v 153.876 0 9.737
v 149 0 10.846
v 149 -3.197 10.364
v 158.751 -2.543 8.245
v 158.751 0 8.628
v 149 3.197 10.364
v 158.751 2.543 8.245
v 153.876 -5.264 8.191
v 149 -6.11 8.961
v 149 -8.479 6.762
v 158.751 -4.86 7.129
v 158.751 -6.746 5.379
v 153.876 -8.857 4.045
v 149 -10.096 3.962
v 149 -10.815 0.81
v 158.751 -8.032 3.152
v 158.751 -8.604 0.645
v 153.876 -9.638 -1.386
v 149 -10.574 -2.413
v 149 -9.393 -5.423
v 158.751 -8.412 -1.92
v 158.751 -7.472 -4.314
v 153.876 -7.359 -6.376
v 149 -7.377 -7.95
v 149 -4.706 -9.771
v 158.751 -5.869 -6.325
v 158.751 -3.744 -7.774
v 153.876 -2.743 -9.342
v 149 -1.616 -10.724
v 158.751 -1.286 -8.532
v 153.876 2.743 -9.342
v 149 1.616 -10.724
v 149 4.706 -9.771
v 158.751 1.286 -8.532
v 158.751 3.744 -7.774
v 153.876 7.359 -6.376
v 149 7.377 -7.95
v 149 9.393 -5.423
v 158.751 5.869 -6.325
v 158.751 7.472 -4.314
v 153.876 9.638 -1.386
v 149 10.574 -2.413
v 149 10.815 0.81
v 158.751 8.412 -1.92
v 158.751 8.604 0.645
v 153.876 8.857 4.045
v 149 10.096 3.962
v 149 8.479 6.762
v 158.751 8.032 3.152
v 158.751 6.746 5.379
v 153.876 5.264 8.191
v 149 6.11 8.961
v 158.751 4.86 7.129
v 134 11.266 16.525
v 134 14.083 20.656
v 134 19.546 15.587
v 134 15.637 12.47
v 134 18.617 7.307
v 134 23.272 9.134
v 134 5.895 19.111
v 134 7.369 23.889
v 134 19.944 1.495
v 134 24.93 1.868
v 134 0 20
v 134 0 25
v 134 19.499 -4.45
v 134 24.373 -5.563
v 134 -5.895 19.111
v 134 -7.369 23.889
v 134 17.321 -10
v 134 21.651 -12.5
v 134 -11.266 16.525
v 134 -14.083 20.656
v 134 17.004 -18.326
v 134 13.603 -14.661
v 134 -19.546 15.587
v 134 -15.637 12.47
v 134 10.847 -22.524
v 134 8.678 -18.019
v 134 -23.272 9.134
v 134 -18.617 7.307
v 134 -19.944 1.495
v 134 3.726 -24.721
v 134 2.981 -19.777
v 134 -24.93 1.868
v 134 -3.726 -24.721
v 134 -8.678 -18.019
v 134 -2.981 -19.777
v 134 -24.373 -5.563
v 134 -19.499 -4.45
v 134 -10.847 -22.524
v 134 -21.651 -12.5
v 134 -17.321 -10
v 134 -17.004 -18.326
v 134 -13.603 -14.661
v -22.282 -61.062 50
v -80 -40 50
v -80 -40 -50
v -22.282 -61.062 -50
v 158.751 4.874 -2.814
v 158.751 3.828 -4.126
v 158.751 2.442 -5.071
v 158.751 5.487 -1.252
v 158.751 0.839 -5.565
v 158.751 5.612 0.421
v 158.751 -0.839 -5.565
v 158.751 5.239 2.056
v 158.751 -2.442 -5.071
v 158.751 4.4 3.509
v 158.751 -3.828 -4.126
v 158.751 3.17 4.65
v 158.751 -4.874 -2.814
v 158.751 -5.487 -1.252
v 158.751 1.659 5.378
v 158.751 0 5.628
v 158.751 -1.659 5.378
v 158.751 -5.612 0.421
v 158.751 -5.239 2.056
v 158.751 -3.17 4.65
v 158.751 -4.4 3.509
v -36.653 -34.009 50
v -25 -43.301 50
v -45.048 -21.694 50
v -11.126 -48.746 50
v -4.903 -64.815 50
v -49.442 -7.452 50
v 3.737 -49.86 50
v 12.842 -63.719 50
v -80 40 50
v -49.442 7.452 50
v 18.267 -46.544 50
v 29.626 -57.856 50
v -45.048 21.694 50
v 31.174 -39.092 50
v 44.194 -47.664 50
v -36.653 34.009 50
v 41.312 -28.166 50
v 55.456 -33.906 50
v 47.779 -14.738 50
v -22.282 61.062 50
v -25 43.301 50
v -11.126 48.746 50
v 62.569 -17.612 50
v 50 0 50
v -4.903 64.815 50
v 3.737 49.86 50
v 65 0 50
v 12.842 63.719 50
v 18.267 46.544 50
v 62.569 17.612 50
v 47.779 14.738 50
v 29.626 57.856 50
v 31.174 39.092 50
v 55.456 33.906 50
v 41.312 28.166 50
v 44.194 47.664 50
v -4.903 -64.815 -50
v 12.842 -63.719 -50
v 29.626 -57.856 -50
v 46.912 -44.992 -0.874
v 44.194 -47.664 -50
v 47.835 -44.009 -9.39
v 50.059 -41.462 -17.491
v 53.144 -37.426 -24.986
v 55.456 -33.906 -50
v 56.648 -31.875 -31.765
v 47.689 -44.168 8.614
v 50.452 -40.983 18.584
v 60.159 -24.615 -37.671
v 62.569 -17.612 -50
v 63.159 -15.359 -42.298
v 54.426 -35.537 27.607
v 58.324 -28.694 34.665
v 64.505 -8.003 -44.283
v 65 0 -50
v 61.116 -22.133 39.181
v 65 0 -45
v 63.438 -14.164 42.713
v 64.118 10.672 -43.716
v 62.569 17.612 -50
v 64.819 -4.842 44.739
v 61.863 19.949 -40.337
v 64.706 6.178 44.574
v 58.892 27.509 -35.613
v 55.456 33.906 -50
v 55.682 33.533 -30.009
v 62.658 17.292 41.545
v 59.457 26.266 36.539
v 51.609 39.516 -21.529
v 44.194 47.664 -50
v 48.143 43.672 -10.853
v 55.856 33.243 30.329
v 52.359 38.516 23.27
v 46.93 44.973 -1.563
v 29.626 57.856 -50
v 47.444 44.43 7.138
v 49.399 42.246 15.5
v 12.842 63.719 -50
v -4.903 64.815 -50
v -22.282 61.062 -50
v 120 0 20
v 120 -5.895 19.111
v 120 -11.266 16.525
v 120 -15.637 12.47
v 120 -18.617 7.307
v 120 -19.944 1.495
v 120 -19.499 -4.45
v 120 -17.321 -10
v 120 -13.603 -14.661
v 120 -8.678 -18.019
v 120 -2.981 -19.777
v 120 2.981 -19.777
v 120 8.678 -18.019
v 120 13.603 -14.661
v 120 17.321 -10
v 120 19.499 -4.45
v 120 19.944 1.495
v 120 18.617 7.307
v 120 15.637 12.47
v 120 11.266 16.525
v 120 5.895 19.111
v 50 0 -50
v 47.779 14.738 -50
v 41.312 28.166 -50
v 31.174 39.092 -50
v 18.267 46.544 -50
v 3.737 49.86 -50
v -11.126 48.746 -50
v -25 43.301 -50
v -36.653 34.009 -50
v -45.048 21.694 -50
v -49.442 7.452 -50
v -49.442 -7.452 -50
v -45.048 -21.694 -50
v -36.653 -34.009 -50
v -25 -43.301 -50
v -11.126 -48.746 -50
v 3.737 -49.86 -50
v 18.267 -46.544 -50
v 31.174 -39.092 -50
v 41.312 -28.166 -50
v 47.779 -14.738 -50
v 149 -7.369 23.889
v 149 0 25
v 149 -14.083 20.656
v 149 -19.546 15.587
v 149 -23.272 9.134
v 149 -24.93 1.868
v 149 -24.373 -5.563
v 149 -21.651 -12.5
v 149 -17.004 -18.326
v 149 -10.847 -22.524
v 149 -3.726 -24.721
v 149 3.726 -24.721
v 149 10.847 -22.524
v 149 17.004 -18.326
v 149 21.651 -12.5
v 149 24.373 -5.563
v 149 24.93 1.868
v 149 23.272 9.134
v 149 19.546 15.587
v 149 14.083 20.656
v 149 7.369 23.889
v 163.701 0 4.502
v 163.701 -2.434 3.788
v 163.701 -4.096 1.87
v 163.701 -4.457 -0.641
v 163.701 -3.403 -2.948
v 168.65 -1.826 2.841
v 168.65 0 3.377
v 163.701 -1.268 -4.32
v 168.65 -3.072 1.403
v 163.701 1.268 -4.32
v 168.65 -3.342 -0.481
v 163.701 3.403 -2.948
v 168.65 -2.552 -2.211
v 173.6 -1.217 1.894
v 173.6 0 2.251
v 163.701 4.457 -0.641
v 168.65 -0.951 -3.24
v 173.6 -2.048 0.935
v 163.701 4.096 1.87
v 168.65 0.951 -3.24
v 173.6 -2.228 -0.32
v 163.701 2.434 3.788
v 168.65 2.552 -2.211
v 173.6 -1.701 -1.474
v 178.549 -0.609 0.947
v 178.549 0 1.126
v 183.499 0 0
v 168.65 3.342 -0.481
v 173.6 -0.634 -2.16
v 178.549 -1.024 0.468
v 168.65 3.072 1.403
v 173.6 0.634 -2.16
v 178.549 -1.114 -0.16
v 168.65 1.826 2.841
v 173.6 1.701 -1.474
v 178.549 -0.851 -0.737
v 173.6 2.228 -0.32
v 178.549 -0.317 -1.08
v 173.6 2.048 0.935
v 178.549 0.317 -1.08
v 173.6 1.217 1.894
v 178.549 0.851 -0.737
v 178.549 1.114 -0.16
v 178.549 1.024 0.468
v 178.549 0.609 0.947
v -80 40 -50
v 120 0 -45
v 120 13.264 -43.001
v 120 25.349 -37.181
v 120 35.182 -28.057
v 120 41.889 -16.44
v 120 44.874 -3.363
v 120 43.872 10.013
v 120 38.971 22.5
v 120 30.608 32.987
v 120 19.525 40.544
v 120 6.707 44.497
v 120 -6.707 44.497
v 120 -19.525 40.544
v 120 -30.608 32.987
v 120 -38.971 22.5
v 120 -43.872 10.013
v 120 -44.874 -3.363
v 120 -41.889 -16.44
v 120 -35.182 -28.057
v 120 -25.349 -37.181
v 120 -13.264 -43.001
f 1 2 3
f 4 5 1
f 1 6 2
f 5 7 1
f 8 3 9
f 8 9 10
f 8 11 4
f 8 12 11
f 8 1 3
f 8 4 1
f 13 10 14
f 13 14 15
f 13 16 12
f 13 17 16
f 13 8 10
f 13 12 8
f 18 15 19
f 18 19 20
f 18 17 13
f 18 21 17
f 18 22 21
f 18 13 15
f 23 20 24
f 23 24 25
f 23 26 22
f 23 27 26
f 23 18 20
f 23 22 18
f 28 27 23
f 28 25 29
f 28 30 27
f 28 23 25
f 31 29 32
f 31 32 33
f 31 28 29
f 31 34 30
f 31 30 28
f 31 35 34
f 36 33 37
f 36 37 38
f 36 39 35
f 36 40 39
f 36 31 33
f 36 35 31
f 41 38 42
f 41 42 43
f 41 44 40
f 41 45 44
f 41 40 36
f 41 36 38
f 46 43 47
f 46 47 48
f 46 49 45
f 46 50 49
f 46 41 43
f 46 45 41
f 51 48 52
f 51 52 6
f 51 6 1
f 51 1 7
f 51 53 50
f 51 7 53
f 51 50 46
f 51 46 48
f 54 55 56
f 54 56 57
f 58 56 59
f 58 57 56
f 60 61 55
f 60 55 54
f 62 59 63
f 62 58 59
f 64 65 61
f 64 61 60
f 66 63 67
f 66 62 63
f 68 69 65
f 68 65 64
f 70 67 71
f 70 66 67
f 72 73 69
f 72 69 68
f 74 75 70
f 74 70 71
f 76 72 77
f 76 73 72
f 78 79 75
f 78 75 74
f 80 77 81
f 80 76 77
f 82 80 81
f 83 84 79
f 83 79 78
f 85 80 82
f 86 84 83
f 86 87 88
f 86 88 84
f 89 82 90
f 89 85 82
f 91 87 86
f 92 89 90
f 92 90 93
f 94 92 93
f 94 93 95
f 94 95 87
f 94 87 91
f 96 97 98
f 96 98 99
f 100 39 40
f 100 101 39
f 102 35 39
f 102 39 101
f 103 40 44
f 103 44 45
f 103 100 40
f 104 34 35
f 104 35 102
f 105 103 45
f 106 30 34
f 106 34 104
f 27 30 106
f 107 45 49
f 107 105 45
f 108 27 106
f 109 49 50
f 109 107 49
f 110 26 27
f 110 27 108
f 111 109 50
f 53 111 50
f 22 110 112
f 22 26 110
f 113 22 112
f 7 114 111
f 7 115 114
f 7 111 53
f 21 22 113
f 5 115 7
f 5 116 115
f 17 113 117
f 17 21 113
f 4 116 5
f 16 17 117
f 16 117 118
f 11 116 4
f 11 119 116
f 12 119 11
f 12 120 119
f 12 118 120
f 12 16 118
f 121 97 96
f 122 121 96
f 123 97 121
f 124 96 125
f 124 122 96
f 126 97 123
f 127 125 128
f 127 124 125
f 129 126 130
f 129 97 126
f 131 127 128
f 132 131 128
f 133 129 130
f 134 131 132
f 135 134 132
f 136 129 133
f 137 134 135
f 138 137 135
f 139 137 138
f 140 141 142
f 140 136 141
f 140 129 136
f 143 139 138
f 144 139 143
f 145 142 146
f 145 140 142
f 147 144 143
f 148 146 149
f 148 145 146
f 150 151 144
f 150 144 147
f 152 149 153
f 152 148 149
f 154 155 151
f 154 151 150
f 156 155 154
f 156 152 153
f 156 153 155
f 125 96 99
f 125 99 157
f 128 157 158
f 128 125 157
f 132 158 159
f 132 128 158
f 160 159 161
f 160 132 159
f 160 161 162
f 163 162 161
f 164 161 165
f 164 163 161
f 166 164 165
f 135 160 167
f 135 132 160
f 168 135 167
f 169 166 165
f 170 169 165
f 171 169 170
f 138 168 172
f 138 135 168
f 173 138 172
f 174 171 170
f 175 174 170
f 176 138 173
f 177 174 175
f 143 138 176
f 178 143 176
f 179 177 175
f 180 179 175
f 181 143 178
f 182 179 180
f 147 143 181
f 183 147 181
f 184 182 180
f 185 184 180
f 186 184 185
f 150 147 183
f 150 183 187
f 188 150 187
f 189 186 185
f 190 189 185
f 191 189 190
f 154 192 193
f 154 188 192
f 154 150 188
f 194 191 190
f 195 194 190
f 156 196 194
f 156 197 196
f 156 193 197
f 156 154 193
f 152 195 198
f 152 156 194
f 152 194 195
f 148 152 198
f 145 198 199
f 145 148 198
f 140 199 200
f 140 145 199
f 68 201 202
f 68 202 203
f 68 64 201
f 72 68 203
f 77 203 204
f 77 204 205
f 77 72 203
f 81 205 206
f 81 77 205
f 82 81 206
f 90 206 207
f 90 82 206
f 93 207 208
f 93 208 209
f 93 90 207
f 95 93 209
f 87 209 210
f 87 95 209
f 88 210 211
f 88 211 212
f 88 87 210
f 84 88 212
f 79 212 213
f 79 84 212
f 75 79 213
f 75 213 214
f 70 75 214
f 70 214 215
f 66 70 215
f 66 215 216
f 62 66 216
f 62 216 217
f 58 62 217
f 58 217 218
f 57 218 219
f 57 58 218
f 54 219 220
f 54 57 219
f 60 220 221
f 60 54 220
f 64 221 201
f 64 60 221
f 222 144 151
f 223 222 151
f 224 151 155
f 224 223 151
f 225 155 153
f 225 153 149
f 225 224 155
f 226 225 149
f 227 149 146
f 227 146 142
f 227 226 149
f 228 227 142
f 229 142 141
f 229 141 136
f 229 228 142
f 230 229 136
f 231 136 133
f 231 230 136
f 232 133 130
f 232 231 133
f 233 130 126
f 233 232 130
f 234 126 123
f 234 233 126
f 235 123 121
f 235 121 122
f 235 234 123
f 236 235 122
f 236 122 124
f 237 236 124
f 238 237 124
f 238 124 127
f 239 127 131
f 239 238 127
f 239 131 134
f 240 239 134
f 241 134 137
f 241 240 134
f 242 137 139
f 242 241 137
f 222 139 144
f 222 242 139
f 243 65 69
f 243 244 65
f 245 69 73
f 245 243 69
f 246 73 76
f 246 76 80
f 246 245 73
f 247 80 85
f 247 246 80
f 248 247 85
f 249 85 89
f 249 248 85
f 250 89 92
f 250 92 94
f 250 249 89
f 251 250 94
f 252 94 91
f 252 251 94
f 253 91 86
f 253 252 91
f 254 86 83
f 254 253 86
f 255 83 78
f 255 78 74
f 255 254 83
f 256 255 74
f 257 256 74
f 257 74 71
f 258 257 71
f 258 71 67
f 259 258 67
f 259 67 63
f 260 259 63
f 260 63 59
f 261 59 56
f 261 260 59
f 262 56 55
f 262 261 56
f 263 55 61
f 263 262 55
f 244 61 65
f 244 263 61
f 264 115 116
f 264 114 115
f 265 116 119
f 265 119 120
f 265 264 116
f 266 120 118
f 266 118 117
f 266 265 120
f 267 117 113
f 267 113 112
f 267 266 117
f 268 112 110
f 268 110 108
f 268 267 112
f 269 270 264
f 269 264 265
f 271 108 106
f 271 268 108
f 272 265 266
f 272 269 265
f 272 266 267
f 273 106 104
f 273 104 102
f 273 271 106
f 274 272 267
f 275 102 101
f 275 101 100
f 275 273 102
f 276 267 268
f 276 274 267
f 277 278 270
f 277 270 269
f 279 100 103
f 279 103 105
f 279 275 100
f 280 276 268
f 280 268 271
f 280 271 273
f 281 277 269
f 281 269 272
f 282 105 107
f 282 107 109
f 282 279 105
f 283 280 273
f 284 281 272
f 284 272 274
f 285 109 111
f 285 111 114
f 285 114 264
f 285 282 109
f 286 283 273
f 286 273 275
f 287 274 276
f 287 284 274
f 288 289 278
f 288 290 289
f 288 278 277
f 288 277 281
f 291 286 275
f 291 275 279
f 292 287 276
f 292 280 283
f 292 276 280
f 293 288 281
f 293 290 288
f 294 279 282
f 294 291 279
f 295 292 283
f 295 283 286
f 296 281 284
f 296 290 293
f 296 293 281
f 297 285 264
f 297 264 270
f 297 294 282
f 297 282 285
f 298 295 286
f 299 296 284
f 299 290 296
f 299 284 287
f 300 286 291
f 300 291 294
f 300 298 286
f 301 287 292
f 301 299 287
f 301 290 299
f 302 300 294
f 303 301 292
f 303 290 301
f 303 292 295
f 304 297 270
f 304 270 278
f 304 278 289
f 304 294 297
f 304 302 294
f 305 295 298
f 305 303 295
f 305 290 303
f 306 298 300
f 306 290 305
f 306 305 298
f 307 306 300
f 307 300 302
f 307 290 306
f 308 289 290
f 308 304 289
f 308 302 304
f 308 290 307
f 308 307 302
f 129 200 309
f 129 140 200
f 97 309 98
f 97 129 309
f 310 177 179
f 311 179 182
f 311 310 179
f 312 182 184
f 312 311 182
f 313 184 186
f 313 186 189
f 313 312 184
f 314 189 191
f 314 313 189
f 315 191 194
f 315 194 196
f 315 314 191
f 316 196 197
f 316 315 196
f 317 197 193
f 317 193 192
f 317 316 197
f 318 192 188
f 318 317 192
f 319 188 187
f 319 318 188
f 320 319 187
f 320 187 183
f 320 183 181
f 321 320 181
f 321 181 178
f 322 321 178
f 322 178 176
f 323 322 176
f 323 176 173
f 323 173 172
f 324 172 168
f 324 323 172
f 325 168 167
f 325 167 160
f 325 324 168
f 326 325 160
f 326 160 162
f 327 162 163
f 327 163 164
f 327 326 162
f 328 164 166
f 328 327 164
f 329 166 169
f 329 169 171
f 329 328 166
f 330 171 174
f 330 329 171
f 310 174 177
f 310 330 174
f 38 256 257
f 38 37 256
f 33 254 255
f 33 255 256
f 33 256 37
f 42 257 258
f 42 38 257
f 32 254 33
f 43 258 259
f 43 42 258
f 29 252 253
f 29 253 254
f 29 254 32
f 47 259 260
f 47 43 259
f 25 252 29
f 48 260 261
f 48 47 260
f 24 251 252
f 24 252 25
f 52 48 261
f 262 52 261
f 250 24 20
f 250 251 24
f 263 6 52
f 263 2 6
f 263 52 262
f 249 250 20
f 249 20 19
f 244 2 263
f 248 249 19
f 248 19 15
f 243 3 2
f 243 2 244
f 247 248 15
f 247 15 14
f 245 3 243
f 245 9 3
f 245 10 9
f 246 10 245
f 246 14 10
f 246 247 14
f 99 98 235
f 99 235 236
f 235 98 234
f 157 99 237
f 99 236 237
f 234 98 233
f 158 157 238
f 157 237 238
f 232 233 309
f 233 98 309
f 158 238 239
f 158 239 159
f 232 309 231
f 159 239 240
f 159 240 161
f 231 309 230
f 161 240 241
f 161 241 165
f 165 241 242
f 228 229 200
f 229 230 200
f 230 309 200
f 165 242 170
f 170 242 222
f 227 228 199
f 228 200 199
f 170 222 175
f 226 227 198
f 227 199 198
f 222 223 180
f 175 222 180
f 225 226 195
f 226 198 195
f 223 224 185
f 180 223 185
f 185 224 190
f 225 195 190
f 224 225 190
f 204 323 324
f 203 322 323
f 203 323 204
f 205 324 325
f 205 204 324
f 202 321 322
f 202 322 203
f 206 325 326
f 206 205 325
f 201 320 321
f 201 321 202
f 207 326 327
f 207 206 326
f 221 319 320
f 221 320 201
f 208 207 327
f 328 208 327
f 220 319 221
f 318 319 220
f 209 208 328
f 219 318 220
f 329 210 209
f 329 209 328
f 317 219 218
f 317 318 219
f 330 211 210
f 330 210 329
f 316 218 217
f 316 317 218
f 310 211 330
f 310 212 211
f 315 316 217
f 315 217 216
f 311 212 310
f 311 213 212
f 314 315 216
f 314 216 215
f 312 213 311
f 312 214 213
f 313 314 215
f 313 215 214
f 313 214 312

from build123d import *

# Parameters (mm, degrees)
SKETCH1_R                = 50
BOSS_EXTRUDE1_DEPTH      = 50
BOSS_EXTRUDE2_REACH      = 218.16
BOSS_EXTRUDE2_END_RADIUS = 65
SKETCH2_R                = 45


with BuildPart() as part:
    # Sketch1 → Boss-Extrude1 (new, symmetric)
    with BuildSketch(Plane.XY):
        with BuildLine():
            Line((-80, 40), (-80, -40))
            Line((-80, -40), (-22.281665693, -61.061668614))
            ThreePointArc((-22.281665693, -61.061668614), (65, 0), (-22.281665693, 61.061668614))
            Line((-22.281665693, 61.061668614), (-80, 40))
        make_face()
        Circle(SKETCH1_R, mode=Mode.SUBTRACT)
    extrude(amount=BOSS_EXTRUDE1_DEPTH, both=True)

    # Boss-Extrude2: up to this cylinder (the profile starts outside it)
    boss_extrude2_end = Plane(origin=(0, 0, 0), z_dir=(0, 0, -1)) * Cylinder(BOSS_EXTRUDE2_END_RADIUS, 567.32, mode=Mode.PRIVATE)
    # Sketch2 → Boss-Extrude2 (add, up to the surface)
    with BuildSketch(Plane(origin=(120, 0, 0), x_dir=(0, 0, -1), z_dir=(1, 0, 0)), mode=Mode.PRIVATE) as boss_extrude2_sk1:
        Circle(SKETCH2_R)
    boss_extrude2_tool1 = extrude(boss_extrude2_sk1.sketch, amount=-BOSS_EXTRUDE2_REACH, mode=Mode.PRIVATE) - boss_extrude2_end
    add(boss_extrude2_tool1.solids().sort_by_distance((120, 0, 0))[0])

    # Sketch4 → Revolve1 (revolve)
    with BuildSketch(Plane.XY, mode=Mode.PRIVATE) as revolve1_sk:
        Polygon((120, 0), (120, -20), (134, -20), (134, -25), (149, -25), (149, -10.84553833), (158.751026924, -8.628000521), (158.751026924, -5.628000521), (183.498647636, 0), align=None)
    revolve(revolve1_sk.sketch.rotate(Axis((0, 0, 0), (1, 0, 0)), 270), axis=Axis((0, 0, 0), (1, 0, 0)))


solid = part.part
